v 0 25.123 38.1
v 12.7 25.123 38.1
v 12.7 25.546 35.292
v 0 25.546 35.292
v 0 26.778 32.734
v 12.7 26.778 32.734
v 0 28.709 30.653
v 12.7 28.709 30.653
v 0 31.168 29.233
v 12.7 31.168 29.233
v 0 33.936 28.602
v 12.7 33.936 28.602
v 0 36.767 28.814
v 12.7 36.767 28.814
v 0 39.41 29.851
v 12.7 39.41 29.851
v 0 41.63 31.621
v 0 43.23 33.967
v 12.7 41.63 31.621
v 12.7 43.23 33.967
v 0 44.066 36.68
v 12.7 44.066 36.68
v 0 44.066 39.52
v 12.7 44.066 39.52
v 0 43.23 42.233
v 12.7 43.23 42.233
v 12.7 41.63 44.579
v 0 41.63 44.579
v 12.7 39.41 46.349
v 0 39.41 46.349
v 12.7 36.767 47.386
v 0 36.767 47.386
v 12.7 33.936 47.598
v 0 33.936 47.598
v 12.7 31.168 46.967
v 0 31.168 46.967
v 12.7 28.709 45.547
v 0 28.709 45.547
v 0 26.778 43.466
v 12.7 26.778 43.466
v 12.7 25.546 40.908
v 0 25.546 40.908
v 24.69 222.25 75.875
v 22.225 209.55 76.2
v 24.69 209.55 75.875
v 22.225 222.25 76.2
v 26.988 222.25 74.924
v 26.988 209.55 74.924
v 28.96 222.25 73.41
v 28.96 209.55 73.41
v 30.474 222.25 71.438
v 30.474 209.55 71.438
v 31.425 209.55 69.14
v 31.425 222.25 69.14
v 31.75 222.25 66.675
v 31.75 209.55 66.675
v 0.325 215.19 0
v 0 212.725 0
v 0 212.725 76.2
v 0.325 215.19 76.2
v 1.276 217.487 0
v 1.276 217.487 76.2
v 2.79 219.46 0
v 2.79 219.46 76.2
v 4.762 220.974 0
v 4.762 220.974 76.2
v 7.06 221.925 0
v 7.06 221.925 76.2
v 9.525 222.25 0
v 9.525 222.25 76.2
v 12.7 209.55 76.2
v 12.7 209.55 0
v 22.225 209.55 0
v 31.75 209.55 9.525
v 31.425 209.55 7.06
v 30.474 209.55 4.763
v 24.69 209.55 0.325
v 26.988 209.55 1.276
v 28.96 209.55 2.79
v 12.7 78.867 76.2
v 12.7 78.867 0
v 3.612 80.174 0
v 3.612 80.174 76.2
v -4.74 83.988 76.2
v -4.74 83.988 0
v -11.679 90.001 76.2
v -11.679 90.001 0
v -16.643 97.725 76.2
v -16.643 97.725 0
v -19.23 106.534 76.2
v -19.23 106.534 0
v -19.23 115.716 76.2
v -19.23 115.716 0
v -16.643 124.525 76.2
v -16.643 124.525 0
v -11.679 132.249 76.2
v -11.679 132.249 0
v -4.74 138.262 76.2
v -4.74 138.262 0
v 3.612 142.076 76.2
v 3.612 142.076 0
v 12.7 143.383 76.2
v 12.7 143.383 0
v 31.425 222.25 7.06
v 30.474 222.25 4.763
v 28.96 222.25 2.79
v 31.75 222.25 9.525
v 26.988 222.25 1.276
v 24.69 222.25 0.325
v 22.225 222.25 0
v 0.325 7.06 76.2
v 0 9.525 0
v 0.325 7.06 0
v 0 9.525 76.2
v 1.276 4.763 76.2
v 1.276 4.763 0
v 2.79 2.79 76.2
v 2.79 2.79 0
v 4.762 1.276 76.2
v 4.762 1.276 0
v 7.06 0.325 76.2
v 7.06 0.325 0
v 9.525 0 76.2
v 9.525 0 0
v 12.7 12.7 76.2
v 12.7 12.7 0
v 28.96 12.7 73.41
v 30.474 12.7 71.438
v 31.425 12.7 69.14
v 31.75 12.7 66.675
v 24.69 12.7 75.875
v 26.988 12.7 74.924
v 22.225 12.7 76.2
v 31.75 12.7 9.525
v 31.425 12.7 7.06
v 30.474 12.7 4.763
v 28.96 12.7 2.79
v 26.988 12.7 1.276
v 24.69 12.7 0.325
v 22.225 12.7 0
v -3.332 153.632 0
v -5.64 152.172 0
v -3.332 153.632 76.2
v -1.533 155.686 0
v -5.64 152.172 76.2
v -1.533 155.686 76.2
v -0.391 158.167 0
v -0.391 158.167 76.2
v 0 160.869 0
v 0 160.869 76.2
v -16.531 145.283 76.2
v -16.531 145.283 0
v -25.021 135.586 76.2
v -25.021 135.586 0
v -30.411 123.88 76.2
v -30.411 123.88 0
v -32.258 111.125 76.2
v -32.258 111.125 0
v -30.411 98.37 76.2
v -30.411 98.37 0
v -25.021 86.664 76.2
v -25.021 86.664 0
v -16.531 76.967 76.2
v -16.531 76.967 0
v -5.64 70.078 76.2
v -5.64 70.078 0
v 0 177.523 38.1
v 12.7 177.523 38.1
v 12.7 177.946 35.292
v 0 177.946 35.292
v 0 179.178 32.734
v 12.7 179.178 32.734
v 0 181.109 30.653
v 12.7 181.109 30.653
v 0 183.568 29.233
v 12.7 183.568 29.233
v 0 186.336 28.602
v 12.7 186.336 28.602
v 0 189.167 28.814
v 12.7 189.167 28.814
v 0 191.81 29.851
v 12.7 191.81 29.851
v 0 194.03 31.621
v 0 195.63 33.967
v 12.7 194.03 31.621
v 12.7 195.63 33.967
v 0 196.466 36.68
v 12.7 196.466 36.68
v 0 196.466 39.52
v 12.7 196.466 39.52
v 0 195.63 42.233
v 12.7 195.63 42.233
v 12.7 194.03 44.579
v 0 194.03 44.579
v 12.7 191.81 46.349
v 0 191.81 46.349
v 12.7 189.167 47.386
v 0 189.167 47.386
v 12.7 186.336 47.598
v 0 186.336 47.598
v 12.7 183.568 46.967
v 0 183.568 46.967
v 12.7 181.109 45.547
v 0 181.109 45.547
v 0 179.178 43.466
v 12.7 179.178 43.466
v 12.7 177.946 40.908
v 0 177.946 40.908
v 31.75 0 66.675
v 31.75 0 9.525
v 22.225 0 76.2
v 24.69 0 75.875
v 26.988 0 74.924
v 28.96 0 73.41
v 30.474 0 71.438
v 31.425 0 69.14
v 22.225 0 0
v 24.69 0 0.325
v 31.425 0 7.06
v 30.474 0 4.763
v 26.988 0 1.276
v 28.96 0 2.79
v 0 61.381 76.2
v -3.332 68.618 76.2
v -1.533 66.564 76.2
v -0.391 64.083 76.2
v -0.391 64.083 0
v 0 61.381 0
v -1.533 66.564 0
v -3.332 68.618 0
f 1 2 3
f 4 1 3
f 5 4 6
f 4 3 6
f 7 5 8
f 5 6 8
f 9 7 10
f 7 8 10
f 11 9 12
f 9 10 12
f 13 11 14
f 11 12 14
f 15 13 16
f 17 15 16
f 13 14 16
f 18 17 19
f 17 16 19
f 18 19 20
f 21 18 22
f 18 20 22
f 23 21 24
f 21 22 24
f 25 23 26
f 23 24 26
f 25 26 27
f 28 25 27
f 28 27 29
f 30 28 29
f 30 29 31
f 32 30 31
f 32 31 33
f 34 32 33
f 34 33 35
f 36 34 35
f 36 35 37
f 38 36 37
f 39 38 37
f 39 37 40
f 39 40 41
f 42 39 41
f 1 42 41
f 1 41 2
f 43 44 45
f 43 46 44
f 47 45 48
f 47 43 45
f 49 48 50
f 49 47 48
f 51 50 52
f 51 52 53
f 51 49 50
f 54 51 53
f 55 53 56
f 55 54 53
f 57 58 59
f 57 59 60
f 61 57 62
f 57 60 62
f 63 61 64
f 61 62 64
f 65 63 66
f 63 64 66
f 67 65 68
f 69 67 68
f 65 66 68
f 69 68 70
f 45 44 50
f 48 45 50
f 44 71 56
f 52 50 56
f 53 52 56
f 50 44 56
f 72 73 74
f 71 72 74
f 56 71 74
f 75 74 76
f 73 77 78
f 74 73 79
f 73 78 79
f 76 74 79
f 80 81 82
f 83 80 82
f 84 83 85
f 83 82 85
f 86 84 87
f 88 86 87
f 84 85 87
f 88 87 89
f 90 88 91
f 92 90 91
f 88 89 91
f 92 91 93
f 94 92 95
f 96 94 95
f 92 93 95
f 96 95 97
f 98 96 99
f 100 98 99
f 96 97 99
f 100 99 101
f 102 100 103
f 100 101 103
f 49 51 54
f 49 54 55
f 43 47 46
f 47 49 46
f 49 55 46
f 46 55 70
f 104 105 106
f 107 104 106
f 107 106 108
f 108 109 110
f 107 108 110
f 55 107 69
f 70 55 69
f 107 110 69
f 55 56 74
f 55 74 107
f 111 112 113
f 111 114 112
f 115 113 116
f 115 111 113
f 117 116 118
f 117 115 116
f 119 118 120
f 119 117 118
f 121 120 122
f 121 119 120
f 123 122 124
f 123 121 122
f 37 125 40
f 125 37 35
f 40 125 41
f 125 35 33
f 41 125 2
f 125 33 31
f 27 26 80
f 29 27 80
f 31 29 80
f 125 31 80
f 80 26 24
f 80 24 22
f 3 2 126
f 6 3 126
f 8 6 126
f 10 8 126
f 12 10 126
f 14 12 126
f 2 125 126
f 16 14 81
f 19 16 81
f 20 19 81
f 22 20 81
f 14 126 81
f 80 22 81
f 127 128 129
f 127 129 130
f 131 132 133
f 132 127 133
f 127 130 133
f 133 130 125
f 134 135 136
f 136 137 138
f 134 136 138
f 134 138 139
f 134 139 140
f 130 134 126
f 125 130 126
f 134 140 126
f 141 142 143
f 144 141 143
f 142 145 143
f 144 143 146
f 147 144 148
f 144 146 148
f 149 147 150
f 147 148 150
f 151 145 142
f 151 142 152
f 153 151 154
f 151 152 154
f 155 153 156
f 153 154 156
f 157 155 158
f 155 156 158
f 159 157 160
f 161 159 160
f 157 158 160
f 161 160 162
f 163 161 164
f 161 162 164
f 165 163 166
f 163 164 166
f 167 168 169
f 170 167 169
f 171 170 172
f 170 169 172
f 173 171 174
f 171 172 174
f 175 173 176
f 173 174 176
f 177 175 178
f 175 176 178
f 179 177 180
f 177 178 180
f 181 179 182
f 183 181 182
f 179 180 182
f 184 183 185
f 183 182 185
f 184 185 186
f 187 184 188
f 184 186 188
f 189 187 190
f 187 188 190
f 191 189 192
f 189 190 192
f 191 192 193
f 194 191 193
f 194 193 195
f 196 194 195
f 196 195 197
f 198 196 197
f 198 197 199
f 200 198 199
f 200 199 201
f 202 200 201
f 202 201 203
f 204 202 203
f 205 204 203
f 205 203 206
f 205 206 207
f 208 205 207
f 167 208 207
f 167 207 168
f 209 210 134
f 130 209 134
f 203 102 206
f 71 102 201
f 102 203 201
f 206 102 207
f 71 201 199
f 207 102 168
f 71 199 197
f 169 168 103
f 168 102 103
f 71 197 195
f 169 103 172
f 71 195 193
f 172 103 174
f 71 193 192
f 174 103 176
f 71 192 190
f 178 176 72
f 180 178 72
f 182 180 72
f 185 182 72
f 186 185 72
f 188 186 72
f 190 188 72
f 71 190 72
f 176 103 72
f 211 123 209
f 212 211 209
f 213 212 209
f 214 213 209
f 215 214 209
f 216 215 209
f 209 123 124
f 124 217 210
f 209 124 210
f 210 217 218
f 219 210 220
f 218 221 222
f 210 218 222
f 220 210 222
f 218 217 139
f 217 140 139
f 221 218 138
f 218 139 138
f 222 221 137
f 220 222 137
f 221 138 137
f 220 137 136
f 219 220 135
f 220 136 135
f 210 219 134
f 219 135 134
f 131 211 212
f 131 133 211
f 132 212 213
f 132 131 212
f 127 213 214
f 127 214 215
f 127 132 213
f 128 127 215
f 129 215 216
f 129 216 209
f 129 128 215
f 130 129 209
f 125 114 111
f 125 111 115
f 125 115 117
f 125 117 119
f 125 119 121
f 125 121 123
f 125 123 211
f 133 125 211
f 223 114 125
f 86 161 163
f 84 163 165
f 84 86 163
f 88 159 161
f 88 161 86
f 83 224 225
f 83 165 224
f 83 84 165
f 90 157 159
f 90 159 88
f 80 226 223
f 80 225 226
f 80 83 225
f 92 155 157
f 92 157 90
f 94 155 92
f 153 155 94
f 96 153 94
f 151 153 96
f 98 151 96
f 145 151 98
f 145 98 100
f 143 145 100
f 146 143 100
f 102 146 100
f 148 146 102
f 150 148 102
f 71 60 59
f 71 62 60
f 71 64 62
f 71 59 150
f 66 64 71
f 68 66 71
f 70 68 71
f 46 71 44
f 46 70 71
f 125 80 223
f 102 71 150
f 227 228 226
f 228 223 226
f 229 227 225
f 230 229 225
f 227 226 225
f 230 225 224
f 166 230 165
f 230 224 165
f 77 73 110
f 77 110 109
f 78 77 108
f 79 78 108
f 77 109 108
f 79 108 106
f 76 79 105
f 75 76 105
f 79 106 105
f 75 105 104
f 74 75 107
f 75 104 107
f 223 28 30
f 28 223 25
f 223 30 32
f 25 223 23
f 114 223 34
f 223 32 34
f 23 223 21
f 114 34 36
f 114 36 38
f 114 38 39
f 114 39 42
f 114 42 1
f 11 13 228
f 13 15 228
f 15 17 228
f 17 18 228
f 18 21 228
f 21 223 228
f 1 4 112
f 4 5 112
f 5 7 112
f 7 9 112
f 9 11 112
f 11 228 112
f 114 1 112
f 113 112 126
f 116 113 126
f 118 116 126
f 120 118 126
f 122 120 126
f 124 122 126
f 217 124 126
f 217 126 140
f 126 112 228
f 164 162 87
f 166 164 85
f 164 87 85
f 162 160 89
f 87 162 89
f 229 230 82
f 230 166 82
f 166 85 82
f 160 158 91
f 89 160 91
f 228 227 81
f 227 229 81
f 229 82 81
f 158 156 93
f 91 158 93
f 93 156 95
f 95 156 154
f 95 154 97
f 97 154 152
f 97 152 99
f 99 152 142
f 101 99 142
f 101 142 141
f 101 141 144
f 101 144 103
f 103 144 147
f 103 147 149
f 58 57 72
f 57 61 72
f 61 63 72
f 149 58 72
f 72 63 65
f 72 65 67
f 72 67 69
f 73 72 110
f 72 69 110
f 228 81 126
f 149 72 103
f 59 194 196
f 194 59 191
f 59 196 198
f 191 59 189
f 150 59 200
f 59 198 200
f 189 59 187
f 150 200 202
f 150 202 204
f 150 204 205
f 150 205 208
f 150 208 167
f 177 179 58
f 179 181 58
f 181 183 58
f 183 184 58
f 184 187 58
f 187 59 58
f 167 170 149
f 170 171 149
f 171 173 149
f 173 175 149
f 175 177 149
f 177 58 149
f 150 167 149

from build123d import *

# Parameters (mm, degrees)
F1_DEPTH = 76.2
F3_D     = 19.05
F4_R     = 9.525


with BuildPart() as f1:
    # F0 (on Top) → F1 (new body)
    with BuildSketch(Plane.XY):
        with BuildLine():
            Line((0, 67.9980737937), (0, 0))
            Line((0, 0), (31.75, 0))
            Line((31.75, 0), (31.75, 12.7))
            Line((31.75, 12.7), (12.7, 12.7))
            Line((12.7, 12.7), (12.7, 78.867))
            ThreePointArc((12.7, 78.867), (-19.558, 111.125), (12.7, 143.383))
            Line((12.7, 143.383), (12.7, 209.55))
            Line((12.7, 209.55), (31.75, 209.55))
            Line((31.75, 209.55), (31.75, 222.25))
            Line((31.75, 222.25), (0, 222.25))
            Line((0, 222.25), (0, 154.2519262063))
            ThreePointArc((0, 154.2519262063), (-32.258, 111.125), (0, 67.9980737937))
        make_face()
    extrude(amount=F1_DEPTH)

    # F3 (through all)
    with Locations(Plane(origin=(0, 0, 0), x_dir=(0, 1, 0), z_dir=(-1, 0, 0))):
        with Locations((187.0478298216, -38.1), (34.6478298216, -38.1)):
            Hole(F3_D / 2)

    # F4
    f4_edges = [f1.edges().sort_by_distance(p)[0] for p in [
        (0, 67.998074, 38.1),
        (0, 154.251926, 38.1),
        (0, 0, 38.1),
        (31.75, 6.35, 76.2),
        (31.75, 6.35, 0),
        (31.75, 215.9, 76.2),
        (31.75, 215.9, 0),
        (0, 222.25, 38.1),
    ]]
    fillet(f4_edges, radius=F4_R)


solid = f1.part
